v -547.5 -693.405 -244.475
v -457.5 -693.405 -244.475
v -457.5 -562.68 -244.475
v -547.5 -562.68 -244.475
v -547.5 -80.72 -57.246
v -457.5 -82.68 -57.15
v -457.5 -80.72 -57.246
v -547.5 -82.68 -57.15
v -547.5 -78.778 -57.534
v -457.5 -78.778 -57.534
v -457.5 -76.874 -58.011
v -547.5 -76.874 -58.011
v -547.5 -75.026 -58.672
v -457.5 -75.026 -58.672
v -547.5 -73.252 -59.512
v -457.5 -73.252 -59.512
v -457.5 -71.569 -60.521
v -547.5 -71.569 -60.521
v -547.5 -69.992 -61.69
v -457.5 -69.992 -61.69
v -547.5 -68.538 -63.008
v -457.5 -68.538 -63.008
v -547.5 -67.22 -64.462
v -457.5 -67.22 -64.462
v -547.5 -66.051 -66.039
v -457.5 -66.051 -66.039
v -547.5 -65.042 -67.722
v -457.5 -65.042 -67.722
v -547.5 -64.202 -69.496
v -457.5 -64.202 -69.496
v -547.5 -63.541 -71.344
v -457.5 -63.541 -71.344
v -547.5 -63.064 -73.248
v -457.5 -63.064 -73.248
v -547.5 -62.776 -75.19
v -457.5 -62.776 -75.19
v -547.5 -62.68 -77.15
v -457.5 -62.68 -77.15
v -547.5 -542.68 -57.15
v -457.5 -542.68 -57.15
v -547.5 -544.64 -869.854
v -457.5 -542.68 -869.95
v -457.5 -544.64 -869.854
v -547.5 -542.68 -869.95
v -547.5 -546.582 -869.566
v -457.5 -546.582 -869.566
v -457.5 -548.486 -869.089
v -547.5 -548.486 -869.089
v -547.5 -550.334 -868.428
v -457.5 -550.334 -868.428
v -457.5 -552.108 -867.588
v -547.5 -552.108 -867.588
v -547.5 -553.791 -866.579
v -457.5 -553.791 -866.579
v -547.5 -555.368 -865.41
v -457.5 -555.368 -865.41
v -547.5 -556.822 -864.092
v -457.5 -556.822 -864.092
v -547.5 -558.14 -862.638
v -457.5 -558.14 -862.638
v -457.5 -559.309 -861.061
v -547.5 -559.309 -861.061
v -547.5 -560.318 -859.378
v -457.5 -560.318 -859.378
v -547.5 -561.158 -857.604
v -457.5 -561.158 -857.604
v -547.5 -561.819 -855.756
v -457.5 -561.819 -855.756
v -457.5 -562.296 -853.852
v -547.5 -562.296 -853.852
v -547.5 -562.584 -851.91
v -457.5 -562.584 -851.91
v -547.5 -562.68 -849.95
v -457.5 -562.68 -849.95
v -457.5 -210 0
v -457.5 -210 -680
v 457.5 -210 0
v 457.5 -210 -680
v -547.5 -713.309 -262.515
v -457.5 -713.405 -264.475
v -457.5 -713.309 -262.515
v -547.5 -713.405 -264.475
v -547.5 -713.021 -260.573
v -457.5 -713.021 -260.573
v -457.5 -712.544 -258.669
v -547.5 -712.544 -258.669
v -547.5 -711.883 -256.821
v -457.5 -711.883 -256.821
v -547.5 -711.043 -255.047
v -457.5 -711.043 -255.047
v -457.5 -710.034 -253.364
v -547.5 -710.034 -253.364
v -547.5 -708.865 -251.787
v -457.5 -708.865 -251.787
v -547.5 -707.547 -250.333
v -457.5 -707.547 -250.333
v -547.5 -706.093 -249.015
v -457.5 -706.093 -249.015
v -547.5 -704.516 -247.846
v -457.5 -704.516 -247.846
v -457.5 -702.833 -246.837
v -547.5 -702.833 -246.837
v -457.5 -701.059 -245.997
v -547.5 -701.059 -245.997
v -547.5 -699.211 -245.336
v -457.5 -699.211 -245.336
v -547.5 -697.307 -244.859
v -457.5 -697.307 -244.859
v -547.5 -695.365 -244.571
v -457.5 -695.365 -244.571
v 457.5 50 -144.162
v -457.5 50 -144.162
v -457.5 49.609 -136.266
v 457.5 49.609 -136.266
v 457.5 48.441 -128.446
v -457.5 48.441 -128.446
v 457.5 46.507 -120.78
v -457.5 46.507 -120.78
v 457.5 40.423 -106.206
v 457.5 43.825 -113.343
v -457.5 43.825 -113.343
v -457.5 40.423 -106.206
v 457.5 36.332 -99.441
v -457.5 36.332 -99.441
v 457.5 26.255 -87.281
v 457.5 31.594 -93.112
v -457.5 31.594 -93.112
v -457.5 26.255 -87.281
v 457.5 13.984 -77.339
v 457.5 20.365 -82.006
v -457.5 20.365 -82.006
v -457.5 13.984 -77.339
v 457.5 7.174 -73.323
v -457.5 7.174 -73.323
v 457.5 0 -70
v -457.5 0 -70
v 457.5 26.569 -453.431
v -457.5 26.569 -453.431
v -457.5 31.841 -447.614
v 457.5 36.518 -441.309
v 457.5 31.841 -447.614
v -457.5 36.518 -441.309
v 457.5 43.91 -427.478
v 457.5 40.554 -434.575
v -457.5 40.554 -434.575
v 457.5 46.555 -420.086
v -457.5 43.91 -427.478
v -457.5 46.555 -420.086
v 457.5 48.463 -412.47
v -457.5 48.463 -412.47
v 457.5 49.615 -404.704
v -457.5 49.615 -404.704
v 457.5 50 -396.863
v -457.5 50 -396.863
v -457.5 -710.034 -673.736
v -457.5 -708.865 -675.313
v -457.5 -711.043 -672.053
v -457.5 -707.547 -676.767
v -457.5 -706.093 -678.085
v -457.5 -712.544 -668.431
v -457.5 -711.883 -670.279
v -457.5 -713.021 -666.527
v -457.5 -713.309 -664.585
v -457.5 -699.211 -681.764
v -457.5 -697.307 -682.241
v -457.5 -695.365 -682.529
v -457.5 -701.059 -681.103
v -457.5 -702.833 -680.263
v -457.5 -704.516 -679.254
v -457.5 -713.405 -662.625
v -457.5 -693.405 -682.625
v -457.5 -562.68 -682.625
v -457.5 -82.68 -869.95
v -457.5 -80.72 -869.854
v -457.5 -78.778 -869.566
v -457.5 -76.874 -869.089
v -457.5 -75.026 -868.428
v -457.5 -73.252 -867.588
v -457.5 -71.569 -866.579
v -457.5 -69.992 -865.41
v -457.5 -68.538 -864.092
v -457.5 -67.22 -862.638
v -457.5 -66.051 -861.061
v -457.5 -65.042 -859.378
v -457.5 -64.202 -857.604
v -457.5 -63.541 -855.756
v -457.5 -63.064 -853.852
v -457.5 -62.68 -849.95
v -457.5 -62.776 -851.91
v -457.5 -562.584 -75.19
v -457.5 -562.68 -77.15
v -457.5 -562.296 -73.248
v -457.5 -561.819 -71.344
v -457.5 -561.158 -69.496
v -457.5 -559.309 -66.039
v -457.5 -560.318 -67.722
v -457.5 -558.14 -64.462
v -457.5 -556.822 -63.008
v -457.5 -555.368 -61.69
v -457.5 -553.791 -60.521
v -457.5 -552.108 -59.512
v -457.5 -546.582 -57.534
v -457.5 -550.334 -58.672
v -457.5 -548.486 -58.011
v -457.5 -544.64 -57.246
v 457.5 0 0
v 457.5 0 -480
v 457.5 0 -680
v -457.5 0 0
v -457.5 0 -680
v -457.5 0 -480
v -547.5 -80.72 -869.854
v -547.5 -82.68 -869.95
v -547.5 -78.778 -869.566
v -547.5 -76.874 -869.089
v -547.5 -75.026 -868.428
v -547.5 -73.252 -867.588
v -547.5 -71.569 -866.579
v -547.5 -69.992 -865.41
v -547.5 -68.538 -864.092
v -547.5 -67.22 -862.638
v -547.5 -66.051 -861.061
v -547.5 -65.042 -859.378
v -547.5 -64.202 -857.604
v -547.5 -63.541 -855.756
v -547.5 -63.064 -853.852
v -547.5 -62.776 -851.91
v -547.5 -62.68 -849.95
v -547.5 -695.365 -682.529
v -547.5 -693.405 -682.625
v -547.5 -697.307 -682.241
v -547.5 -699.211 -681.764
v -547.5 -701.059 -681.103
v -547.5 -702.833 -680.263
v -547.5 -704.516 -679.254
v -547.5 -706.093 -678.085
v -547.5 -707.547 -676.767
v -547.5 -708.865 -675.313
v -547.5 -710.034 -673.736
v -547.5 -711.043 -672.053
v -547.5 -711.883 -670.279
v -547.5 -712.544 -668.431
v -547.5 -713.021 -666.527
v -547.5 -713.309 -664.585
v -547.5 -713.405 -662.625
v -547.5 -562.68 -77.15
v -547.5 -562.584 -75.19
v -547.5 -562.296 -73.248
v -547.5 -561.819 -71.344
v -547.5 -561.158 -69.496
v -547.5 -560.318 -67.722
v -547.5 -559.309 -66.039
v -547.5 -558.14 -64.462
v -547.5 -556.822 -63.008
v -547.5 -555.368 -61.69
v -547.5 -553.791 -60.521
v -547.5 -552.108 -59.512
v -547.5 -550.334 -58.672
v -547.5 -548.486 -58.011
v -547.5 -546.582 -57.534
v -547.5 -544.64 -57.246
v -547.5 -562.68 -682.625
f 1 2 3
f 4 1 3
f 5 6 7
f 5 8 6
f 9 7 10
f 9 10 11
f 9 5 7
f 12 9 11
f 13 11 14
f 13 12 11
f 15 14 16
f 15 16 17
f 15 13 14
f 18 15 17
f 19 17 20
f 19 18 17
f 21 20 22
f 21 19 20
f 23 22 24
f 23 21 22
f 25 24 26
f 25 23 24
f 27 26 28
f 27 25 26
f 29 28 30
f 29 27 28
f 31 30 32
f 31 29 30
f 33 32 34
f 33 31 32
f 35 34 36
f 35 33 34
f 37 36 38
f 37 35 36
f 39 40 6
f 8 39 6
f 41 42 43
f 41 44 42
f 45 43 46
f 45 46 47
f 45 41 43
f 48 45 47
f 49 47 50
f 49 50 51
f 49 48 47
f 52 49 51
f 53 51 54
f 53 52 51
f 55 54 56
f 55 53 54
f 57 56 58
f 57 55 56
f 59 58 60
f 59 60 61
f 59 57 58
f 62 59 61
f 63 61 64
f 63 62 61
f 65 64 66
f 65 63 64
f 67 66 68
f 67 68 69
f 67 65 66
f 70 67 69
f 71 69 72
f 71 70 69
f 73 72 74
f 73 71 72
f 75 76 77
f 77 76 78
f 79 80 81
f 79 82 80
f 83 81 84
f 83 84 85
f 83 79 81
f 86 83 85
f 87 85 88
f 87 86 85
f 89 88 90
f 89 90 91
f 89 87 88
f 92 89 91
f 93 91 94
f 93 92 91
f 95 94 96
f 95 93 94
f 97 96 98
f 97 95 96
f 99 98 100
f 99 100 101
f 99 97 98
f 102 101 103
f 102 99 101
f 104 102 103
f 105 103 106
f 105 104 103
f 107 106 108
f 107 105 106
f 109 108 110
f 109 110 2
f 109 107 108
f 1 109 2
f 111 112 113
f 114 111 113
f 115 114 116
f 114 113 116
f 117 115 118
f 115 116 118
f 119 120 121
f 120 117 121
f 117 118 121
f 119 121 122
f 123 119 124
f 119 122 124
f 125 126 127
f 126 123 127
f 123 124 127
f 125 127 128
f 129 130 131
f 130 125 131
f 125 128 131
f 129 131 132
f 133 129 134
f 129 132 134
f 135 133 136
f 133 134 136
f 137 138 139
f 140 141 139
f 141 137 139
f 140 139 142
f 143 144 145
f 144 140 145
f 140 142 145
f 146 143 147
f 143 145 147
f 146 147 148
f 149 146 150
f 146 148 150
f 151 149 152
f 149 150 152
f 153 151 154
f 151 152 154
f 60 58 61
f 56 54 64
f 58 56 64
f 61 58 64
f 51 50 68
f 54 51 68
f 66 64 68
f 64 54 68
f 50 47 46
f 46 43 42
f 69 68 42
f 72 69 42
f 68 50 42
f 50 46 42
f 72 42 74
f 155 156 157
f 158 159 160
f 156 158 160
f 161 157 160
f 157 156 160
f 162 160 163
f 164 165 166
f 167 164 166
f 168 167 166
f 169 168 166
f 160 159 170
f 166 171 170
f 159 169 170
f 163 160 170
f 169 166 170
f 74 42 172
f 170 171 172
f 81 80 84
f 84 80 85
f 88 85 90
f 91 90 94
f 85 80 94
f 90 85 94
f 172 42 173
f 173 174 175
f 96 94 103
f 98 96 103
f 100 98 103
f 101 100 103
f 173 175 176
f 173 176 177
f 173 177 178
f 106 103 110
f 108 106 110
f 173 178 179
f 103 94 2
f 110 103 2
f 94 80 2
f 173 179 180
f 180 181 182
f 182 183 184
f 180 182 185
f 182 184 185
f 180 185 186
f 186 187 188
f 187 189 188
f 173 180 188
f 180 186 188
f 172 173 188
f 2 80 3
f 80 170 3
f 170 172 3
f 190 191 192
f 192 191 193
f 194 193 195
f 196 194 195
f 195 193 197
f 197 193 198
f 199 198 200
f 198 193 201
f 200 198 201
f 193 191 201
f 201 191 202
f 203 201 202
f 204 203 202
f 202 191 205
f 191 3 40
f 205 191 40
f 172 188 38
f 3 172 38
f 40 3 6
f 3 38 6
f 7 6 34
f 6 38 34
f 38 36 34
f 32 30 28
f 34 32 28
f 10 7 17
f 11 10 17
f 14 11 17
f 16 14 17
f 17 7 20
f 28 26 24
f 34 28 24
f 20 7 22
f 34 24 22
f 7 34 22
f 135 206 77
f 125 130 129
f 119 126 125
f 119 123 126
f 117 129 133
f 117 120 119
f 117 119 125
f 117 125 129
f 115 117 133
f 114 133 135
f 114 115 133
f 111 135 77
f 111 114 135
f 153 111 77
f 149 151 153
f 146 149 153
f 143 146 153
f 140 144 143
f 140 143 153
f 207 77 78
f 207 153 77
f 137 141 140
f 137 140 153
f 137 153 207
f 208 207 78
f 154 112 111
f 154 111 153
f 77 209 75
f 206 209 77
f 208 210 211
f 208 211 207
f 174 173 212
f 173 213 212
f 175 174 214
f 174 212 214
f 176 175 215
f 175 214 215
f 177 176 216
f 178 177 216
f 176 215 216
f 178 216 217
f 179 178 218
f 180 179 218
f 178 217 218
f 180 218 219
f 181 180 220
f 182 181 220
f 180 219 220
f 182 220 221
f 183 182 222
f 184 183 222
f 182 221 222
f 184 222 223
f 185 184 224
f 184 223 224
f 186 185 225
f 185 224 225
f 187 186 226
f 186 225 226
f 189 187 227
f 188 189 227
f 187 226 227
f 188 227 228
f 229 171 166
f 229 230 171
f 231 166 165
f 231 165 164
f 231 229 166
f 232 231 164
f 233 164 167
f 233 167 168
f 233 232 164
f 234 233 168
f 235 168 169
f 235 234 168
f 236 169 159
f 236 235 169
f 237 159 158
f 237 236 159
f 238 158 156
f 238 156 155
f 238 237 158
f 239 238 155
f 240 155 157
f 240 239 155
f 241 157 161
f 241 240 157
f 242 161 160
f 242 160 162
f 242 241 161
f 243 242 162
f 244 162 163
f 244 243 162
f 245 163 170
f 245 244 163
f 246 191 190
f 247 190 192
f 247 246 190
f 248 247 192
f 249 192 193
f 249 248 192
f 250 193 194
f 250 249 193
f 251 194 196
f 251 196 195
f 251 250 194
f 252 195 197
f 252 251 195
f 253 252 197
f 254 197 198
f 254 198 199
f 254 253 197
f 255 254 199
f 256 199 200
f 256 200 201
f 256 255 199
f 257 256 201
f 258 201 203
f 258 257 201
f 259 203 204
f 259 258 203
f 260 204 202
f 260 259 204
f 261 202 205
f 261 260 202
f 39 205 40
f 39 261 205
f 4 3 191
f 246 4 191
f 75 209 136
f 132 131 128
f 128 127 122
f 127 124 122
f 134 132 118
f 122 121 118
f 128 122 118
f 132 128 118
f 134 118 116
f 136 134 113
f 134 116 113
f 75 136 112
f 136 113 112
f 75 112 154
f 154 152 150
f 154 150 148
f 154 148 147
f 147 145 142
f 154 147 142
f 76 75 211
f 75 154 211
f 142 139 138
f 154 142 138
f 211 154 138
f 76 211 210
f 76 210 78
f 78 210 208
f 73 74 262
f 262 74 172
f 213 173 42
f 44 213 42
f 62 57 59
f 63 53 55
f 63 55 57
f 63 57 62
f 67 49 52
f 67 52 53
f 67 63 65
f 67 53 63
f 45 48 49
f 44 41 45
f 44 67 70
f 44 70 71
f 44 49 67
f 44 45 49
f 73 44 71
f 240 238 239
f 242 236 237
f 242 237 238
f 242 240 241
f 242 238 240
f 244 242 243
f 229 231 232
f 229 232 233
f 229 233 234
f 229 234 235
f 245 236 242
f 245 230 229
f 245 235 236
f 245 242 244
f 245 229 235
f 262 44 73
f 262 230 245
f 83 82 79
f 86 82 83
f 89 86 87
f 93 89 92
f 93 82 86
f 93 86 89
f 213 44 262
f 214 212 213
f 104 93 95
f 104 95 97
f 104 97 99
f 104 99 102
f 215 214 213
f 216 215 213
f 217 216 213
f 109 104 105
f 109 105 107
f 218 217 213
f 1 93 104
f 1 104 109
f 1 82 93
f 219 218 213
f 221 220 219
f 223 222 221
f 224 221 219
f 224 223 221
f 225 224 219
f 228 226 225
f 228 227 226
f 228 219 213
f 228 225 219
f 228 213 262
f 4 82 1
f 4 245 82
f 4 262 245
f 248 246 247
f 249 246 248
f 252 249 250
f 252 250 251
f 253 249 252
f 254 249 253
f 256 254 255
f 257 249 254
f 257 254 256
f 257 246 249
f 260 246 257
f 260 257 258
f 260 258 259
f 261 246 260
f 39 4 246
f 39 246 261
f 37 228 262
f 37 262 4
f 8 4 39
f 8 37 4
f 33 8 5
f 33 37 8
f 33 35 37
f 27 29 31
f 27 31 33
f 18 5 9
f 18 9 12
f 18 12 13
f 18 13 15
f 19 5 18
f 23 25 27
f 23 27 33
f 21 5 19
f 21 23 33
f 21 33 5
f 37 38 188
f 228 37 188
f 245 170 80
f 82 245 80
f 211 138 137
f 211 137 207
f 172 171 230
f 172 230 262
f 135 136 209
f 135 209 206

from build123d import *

# Parameters (mm, degrees)
SKETCH1_W           = 915
SKETCH1_H           = 680
BOSS_EXTRUDE1_DEPTH = 210
BOSS_EXTRUDE2_DEPTH = 915
FILLET1_R           = 80
SKETCH5_W           = 438.15
SKETCH5_H           = 150.725
SKETCH5_W_2         = 622.85
SKETCH5_H_2         = 147.32
BOSS_EXTRUDE3_DEPTH = 90
FILLET2_R           = 20


with BuildPart() as part:
    # Sketch1 → Boss-Extrude1 (new body)
    with BuildSketch(Plane(origin=(0, 0, 0), x_dir=(1, 0, 0), z_dir=(0, 1, 0))):
        with Locations((0, 340)):
            Rectangle(SKETCH1_W, SKETCH1_H)
    extrude(amount=-BOSS_EXTRUDE1_DEPTH)

    # Sketch3 → Boss-Extrude2 (add)
    with BuildSketch(Plane.ZY.offset(457.5)):
        Polygon((-70, 0), (-70, 50), (-430, 50), (-480, 0), align=None)
    extrude(amount=-BOSS_EXTRUDE2_DEPTH)

    # Fillet1
    # the kernel refuses this fillet: 80 mm, written as the material it takes off along each edge
    with BuildSketch(Plane(origin=(-642.904962177, 50, -70), x_dir=(0, -1, 0), z_dir=(1, 0, 0))) as fillet1_piece_1:
        with BuildLine():
            CenterArc((80, 74.161984871), FILLET1_R, 180, 67.975687163)
            Line((0, 74.161984871), (-1.6, 74.161984871))
            Line((-1.6, 74.161984871), (-1.6, 0))
            Line((-1.6, 0), (0, -1.6))
            ThreePointArc((0, -1.6), (25, -1.6), (49.4, -1.483239697))
            Line((49.4, -1.483239697), (50, 0))
        make_face()
    extrude(amount=1285.809924355, mode=Mode.SUBTRACT)
    with BuildSketch(Plane(origin=(-540.342712475, 50, -430), x_dir=(0, -0.7071067811865477, -0.7071067811865474), z_dir=(1, 0, 0))) as fillet1_piece_2:
        with BuildLine():
            CenterArc((FILLET1_R * 0.414213562373, -FILLET1_R), FILLET1_R, 90, 45)
            Line((-FILLET1_R * 0.292893218813, -FILLET1_R * 0.292893218813), (-FILLET1_R * 0.307035354437, -FILLET1_R * 0.27875108319))
            Line((-FILLET1_R * 0.307035354437, -FILLET1_R * 0.27875108319), (-FILLET1_R * 0.00828427124746, FILLET1_R * 0.02))
            Line((-FILLET1_R * 0.00828427124746, FILLET1_R * 0.02), (FILLET1_R * 0.414213562373, FILLET1_R * 0.02))
            Line((FILLET1_R * 0.414213562373, FILLET1_R * 0.02), (FILLET1_R * 0.414213562373, 0))
        make_face()
    extrude(amount=1080.685424949, mode=Mode.SUBTRACT)


with BuildPart() as body_2:
    # Sketch5 → Boss-Extrude3 (new body)
    with BuildSketch(Plane.ZY.offset(457.5)):
        Polygon((-680, -210), (-680, -62.68), (-869.95, -62.68), (-869.95, -562.68), (-682.625, -562.68), (-244.475, -562.68), (-57.15, -562.68), (-57.15, -210), align=None)
        with Locations((-463.55, -638.0425)):
            Rectangle(SKETCH5_W, SKETCH5_H)
        with Locations((-368.575, -136.34)):
            Rectangle(SKETCH5_W_2, SKETCH5_H_2)
    extrude(amount=BOSS_EXTRUDE3_DEPTH)

    # Fillet2
    fillet2_edges = [body_2.edges().sort_by_distance(p)[0] for p in [
        (-502.5, -562.68, -57.15),
        (-502.5, -713.405, -244.475),
        (-502.5, -713.405, -682.625),
        (-502.5, -562.68, -869.95),
        (-502.5, -62.68, -869.95),
        (-502.5, -62.68, -57.15),
    ]]
    fillet(fillet2_edges, radius=FILLET2_R)


solid = Compound([part.part, body_2.part])
